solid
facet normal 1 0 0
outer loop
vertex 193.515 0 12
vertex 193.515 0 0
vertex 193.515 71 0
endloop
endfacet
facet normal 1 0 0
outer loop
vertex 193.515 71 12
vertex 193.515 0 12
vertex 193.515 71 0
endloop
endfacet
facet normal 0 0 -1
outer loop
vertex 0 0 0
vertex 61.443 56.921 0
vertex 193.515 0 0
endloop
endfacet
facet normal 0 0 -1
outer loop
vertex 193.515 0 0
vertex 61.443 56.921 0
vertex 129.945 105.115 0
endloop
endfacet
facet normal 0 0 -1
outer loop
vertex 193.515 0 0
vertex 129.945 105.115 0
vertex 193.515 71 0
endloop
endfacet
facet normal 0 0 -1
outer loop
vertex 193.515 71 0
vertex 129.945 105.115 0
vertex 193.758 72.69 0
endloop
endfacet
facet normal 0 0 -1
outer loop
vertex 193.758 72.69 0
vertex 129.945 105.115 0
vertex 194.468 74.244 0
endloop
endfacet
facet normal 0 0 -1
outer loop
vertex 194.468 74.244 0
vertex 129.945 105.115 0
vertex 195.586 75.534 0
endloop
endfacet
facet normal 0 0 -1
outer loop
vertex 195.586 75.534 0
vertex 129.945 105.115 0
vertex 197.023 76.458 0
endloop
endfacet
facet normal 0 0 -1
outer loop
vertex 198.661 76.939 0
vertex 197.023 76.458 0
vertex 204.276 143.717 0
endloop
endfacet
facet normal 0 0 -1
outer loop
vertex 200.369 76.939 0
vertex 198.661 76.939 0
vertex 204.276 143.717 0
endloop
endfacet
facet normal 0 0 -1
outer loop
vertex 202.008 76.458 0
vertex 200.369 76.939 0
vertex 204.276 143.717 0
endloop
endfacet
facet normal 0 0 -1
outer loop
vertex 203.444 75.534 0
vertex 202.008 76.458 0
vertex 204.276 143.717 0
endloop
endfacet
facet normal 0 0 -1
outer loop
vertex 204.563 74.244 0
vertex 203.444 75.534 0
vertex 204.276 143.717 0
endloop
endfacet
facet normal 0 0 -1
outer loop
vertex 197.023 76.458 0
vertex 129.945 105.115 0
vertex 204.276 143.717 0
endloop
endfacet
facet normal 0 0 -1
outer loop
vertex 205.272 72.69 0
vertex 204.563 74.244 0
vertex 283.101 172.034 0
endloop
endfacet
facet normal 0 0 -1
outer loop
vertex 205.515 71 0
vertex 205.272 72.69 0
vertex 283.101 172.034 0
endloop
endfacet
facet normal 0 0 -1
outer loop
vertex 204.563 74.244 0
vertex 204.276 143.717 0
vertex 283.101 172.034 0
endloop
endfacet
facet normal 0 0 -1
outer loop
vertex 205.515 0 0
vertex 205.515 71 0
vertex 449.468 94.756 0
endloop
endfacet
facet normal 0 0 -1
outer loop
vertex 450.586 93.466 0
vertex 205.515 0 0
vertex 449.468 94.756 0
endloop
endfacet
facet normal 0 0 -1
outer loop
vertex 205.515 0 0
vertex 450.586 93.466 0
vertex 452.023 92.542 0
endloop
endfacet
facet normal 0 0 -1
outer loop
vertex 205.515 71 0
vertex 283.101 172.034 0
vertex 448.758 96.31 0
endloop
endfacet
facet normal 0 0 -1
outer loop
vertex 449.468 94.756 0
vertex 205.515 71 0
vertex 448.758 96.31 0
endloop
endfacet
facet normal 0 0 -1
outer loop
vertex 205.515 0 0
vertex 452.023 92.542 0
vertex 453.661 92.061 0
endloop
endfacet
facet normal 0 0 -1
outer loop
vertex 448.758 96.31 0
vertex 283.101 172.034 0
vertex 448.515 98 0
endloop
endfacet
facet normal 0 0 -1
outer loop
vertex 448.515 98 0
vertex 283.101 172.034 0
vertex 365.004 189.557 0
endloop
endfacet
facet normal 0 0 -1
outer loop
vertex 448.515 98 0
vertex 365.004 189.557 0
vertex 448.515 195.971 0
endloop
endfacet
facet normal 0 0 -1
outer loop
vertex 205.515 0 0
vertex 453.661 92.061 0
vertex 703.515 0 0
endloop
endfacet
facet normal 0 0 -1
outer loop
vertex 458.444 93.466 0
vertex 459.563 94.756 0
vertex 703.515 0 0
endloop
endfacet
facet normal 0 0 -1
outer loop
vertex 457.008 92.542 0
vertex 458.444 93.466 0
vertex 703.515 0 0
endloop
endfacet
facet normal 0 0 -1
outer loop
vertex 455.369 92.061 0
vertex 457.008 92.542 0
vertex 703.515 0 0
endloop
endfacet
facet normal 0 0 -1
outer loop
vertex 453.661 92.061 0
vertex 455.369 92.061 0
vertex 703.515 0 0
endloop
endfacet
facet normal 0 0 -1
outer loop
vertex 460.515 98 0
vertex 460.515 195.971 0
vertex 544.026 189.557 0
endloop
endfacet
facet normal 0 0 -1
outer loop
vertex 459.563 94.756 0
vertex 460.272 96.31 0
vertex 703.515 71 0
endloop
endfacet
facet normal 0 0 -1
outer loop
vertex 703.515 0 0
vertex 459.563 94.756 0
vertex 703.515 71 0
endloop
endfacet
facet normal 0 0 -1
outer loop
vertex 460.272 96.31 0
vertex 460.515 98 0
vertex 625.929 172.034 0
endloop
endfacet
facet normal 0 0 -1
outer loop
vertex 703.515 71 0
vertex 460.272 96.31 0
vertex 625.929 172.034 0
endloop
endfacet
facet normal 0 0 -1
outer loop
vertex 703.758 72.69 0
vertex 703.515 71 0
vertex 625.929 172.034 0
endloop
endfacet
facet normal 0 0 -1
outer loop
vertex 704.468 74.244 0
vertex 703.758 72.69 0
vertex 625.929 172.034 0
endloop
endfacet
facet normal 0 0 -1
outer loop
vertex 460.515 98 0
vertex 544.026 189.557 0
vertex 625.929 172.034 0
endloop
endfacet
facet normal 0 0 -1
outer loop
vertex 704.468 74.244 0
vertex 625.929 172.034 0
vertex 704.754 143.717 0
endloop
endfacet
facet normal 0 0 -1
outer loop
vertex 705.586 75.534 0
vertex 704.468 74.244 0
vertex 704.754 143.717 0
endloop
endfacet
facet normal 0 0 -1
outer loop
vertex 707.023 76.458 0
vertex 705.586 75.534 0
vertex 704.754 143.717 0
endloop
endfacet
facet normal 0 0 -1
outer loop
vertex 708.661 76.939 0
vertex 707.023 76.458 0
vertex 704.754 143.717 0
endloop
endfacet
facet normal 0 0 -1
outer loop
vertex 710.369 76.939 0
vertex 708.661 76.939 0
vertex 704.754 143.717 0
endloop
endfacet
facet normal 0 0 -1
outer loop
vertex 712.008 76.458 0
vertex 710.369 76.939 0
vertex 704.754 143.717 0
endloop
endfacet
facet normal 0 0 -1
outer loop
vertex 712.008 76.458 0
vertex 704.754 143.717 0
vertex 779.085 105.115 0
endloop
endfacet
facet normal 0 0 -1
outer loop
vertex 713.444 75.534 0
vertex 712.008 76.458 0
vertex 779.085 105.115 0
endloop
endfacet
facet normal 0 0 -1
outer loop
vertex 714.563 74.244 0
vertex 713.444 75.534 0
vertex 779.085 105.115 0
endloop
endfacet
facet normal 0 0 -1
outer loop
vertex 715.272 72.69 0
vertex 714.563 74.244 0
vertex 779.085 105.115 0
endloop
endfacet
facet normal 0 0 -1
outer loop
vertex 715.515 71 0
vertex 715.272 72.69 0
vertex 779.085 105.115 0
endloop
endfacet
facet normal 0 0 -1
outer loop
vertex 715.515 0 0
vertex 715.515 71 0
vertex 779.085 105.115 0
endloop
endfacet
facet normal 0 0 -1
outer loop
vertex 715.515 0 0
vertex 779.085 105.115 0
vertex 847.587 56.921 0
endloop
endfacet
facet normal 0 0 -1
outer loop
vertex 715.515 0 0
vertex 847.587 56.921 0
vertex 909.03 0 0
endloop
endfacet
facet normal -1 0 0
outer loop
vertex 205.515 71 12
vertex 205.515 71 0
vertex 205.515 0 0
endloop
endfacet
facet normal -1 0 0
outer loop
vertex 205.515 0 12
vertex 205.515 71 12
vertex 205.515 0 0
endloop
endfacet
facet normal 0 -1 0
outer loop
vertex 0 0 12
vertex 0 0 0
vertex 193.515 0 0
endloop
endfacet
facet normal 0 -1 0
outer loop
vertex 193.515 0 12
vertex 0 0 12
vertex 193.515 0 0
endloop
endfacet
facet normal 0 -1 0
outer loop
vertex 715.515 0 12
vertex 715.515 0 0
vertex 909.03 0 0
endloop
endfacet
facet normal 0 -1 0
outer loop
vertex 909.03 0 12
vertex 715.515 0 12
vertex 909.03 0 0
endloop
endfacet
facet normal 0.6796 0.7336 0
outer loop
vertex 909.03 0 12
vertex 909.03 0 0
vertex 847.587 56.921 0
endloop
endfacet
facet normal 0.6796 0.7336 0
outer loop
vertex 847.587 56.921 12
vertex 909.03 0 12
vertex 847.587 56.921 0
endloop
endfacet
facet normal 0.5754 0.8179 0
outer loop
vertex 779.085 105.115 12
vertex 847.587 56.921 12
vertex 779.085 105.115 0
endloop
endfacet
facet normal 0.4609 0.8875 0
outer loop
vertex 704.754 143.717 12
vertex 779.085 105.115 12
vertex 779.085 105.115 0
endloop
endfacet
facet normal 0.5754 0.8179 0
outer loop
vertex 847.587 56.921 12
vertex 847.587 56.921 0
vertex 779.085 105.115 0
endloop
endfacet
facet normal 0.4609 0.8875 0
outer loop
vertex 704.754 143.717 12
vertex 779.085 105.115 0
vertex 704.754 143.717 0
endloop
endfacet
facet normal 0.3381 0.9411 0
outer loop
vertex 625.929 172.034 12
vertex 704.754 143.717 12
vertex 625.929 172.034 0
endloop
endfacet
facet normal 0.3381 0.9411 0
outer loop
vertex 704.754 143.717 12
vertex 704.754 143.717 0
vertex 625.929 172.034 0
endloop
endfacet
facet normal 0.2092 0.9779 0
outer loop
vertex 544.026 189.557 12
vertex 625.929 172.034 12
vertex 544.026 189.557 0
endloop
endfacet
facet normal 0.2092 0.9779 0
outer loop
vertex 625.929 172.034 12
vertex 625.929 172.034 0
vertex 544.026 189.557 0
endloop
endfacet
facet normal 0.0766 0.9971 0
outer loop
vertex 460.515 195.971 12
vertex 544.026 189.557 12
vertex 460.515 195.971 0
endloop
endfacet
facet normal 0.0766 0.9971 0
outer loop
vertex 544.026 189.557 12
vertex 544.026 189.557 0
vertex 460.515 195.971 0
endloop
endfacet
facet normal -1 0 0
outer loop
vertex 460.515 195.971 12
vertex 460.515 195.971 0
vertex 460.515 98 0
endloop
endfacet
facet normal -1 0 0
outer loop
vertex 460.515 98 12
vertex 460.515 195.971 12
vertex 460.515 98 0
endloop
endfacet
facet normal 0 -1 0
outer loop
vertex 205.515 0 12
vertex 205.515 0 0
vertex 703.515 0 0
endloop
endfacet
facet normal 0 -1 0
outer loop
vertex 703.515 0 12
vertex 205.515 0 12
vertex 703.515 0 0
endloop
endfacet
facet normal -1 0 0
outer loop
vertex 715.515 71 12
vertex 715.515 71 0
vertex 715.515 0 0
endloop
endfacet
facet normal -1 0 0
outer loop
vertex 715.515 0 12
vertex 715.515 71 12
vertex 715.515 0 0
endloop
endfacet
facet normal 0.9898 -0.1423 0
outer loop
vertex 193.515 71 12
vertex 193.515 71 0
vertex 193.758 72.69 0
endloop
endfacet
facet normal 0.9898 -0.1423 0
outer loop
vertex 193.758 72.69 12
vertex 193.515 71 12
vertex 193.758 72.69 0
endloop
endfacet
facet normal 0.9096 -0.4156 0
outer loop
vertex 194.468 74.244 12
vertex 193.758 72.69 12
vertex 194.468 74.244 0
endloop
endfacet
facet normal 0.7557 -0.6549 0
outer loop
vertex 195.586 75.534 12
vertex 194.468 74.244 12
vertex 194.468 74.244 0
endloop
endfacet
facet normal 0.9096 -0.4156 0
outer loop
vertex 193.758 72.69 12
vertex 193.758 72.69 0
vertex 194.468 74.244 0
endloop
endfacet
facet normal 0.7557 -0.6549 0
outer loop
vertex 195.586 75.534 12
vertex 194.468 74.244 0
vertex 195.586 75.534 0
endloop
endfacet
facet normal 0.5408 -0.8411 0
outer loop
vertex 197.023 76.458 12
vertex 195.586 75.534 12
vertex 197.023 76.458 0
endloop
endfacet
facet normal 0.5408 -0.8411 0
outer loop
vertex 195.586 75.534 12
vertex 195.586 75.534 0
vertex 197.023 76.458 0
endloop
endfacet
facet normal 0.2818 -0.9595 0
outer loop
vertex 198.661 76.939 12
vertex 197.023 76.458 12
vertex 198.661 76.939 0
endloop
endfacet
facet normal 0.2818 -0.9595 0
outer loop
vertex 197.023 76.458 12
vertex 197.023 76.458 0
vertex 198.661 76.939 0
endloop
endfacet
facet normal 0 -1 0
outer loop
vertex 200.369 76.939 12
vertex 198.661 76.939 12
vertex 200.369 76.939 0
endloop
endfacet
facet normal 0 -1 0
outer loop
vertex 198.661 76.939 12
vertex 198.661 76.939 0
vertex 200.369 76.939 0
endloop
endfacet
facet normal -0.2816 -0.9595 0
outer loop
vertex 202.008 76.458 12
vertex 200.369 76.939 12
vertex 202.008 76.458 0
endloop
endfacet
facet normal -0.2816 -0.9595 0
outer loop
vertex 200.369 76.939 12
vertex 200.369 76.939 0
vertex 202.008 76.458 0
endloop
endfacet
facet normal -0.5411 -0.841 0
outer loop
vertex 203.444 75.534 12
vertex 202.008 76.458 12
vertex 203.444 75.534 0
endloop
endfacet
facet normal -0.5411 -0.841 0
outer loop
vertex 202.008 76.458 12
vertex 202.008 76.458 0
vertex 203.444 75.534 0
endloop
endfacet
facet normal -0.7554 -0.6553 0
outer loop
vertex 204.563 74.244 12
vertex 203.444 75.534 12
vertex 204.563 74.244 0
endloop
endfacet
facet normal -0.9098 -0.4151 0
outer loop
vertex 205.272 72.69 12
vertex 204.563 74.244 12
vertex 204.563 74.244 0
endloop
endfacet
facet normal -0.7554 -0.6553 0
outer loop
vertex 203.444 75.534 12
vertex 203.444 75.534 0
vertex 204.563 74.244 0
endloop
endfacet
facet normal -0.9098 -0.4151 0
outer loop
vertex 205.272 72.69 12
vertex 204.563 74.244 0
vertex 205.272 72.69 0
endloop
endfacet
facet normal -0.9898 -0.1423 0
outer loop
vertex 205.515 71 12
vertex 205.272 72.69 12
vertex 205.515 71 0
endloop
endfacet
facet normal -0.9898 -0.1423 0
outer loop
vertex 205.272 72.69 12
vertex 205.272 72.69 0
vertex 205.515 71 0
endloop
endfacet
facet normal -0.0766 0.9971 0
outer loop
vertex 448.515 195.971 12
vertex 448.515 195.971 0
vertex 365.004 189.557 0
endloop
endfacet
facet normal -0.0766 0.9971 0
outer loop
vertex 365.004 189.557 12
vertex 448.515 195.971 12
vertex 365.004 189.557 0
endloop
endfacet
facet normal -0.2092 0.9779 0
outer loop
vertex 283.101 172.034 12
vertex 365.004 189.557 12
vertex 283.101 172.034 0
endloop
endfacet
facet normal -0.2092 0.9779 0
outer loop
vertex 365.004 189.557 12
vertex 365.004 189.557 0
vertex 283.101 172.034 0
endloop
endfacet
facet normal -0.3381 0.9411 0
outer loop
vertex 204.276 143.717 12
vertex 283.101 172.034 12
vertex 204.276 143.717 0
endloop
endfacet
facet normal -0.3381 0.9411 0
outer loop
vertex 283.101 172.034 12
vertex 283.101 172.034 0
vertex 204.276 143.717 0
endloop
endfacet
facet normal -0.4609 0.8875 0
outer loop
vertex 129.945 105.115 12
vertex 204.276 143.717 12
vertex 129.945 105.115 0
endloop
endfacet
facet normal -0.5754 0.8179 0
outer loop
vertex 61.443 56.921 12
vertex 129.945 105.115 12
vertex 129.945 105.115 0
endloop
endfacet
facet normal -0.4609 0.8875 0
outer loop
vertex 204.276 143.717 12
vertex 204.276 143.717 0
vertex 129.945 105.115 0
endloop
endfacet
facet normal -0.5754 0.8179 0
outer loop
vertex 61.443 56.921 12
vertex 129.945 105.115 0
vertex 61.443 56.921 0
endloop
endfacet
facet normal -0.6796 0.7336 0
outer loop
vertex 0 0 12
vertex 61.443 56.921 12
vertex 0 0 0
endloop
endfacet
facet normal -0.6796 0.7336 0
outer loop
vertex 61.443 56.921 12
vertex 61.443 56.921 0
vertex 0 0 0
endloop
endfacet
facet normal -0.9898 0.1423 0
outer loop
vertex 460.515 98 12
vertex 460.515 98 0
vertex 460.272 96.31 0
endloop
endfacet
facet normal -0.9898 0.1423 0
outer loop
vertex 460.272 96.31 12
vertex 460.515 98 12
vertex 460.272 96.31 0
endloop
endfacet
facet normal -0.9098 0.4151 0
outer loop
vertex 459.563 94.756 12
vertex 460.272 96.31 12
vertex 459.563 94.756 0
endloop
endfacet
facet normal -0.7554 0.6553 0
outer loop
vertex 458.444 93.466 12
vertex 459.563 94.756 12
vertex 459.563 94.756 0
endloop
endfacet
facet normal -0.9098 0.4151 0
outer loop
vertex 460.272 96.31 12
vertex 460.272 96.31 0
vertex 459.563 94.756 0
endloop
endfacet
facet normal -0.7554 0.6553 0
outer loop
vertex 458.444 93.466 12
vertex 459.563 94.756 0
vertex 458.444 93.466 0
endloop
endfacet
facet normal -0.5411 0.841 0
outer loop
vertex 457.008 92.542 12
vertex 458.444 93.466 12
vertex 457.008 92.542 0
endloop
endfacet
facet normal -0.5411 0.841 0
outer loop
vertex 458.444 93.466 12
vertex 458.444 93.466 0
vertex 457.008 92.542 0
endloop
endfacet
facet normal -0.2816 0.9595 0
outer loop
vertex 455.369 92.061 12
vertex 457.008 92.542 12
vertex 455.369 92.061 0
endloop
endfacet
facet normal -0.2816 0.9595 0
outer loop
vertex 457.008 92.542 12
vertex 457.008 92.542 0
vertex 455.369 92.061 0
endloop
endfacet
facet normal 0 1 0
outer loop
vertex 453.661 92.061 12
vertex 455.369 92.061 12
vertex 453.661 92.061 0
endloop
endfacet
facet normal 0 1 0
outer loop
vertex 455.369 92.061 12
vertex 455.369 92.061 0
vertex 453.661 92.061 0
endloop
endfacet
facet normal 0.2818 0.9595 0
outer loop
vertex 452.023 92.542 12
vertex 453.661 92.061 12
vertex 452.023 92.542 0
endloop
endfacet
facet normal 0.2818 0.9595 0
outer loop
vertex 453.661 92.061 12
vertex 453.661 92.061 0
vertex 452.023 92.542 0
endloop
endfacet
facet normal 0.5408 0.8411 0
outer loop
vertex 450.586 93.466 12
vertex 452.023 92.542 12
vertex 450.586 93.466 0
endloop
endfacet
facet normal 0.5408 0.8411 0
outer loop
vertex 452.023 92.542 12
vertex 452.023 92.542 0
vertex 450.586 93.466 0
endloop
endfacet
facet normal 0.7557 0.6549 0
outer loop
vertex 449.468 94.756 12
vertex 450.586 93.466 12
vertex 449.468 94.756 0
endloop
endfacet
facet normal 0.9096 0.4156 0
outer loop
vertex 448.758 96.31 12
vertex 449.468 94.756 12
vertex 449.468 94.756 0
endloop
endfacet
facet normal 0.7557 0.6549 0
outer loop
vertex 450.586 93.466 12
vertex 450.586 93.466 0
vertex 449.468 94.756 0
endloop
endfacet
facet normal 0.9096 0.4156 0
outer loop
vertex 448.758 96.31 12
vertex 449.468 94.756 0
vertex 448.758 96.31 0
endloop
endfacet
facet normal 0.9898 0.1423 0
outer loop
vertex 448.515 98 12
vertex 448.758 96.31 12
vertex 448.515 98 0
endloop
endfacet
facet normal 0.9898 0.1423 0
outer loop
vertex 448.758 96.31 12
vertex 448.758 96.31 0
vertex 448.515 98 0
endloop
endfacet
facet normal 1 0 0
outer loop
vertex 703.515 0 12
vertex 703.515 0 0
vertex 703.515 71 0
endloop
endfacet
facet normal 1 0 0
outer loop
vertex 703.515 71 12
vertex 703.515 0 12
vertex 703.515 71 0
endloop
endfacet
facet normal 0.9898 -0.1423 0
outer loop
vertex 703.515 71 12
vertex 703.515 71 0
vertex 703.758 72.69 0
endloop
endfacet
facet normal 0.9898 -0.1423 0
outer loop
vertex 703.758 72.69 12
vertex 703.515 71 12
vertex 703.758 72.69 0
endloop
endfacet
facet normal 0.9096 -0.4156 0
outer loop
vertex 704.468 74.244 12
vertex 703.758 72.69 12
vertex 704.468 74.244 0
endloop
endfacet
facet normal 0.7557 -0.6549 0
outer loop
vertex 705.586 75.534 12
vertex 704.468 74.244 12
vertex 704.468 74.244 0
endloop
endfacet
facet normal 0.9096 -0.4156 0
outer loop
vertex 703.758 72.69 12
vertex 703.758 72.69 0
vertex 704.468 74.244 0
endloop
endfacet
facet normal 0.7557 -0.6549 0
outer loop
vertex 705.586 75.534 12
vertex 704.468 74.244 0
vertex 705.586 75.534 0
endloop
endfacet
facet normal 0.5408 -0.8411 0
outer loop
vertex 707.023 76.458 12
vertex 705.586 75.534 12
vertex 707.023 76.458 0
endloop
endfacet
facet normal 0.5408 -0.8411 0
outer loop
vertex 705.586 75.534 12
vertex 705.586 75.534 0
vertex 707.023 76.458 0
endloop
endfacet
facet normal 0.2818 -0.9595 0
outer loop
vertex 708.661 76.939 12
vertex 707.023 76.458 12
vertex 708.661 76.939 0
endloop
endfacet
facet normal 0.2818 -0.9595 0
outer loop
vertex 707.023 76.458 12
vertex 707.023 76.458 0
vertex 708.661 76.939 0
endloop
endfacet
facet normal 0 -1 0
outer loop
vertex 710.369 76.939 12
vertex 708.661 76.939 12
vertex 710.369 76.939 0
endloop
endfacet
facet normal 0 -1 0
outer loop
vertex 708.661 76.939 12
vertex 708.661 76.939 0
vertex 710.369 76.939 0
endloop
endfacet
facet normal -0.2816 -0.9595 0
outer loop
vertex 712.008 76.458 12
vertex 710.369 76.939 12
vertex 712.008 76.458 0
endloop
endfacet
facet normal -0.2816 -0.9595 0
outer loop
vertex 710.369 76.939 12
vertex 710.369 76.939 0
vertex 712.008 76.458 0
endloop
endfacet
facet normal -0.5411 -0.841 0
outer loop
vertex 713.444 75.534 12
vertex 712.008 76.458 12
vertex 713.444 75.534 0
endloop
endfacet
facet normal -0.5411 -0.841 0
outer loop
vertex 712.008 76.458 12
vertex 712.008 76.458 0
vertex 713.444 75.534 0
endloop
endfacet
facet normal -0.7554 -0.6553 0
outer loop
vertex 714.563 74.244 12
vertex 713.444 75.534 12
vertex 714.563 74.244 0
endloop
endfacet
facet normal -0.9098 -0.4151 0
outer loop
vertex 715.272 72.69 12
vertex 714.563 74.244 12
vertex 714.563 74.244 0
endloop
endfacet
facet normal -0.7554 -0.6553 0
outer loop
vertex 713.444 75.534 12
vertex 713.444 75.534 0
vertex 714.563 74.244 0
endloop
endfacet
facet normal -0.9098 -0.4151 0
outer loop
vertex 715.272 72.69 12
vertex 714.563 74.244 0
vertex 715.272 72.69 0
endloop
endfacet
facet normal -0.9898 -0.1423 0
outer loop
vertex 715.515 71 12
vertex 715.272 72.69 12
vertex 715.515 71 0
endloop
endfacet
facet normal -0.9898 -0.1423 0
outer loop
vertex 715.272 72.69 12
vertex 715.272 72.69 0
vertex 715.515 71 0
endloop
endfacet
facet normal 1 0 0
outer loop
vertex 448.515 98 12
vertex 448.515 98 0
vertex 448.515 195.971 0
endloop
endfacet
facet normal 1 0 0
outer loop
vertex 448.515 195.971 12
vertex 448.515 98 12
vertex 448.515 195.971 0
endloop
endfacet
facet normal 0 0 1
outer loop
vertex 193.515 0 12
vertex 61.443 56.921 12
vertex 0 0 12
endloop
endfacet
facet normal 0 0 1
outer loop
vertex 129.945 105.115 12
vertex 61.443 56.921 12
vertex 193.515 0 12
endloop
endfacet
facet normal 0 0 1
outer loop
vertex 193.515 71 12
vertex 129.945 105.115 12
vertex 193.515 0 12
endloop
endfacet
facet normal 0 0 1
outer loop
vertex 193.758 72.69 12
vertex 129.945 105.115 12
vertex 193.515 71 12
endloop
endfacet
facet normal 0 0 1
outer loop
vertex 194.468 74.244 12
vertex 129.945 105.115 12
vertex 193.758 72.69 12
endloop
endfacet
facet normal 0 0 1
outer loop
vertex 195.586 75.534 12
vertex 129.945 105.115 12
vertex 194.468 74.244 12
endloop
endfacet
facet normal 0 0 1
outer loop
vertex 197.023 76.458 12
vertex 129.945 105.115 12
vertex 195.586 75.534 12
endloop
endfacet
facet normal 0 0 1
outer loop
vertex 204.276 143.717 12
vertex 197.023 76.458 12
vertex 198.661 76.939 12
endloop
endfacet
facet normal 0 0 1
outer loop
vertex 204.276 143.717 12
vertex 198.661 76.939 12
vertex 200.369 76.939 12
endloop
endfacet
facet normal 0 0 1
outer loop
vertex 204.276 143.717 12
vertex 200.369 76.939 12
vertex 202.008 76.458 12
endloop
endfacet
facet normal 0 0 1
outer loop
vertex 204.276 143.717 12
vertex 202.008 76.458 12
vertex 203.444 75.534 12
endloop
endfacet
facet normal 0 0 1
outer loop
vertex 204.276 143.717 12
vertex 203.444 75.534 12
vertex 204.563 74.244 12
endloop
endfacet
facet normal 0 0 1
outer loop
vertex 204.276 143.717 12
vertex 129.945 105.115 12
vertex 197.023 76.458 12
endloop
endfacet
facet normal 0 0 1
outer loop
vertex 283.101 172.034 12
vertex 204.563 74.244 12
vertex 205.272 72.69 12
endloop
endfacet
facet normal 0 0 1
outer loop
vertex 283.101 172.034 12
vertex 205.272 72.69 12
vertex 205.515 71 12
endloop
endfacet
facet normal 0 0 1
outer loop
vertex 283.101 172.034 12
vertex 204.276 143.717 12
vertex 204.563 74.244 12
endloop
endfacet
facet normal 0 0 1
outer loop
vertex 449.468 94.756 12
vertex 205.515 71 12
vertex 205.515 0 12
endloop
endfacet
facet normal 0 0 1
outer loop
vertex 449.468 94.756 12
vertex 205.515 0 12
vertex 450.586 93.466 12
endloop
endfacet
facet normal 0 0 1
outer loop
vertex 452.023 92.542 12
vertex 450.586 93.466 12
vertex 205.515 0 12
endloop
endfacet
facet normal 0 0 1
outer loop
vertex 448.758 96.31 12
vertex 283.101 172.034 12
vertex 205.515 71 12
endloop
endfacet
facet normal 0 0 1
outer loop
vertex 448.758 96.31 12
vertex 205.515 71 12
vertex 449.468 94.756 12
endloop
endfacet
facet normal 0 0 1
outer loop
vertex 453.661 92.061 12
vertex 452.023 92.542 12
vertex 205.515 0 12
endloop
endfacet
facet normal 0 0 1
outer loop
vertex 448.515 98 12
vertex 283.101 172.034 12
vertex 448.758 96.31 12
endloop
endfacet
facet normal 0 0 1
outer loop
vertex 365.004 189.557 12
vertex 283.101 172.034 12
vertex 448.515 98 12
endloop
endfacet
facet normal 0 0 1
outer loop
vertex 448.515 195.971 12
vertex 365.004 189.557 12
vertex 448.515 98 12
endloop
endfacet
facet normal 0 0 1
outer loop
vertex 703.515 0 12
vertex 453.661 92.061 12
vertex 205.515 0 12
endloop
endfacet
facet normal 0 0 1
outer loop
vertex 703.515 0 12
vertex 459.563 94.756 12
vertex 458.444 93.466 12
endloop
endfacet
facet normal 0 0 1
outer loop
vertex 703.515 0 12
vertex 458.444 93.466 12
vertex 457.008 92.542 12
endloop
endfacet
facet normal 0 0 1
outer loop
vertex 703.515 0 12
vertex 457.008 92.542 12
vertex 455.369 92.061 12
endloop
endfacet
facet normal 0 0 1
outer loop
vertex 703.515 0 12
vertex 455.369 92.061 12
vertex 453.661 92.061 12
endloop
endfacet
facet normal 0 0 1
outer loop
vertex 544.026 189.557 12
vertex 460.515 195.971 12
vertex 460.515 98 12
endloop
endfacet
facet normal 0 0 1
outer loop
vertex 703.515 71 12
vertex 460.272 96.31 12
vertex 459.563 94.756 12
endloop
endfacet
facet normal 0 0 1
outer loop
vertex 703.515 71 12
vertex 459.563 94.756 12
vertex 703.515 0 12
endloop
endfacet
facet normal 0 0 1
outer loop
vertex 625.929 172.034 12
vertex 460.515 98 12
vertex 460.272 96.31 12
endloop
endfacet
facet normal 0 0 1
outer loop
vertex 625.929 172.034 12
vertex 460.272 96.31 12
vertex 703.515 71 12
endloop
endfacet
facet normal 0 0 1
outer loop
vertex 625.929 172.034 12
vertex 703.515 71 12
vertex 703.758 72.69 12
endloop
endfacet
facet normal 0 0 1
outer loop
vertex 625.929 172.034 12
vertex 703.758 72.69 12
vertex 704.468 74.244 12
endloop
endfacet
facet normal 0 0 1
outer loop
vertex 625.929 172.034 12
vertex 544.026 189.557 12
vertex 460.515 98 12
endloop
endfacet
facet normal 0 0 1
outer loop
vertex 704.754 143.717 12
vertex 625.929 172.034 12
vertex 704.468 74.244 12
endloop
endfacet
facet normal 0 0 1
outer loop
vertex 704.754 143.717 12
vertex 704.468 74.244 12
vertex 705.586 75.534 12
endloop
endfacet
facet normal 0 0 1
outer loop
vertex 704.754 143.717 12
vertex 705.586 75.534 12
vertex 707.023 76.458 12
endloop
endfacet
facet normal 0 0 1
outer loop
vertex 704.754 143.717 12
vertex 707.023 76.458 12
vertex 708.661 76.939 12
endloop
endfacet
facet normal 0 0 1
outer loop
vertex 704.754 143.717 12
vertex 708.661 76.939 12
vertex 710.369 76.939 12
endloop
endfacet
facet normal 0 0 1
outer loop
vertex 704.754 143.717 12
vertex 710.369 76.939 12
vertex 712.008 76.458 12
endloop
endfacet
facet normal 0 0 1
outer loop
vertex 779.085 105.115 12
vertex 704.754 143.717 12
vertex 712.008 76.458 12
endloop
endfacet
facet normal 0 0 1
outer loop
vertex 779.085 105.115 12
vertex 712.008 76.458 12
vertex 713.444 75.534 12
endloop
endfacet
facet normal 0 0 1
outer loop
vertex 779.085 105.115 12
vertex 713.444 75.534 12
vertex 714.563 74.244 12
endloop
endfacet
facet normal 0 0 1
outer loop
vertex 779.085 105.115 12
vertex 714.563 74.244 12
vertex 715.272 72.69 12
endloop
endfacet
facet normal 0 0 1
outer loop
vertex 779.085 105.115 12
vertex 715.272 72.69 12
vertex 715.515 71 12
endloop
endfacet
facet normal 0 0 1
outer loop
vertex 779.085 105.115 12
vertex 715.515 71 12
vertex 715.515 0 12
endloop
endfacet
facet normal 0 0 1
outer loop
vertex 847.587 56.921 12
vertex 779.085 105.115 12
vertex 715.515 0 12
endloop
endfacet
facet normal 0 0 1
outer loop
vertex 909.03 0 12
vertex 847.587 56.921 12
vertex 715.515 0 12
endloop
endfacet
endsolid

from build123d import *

# Parameters (mm, degrees)
F1_DEPTH = 12


with BuildPart() as f1:
    # F0 (on Top) → F1 (new body)
    with BuildSketch(Plane.XY):
        with BuildLine():
            Line((715.515126, 0), (909.030253, 0))
            ThreePointArc((909.030253, 0), (704.754458, 143.717449), (460.515126, 195.971199))
            Line((460.515126, 195.971199), (460.515126, 98))
            ThreePointArc((460.515126, 98), (454.515126, 92), (448.515126, 98))
            Line((448.515126, 98), (448.515126, 195.971199))
            ThreePointArc((448.515126, 195.971199), (204.275795, 143.717449), (0, 0))
            Line((0, 0), (193.515126, 0))
            Line((193.515126, 0), (193.515126, 71))
            ThreePointArc((193.515126, 71), (199.515126, 77), (205.515126, 71))
            Line((205.515126, 71), (205.515126, 0))
            Line((205.515126, 0), (703.515126, 0))
            Line((703.515126, 0), (703.515126, 71))
            ThreePointArc((703.515126, 71), (709.515126, 77), (715.515126, 71))
            Line((715.515126, 71), (715.515126, 0))
        make_face()
    extrude(amount=F1_DEPTH)


solid = f1.part
